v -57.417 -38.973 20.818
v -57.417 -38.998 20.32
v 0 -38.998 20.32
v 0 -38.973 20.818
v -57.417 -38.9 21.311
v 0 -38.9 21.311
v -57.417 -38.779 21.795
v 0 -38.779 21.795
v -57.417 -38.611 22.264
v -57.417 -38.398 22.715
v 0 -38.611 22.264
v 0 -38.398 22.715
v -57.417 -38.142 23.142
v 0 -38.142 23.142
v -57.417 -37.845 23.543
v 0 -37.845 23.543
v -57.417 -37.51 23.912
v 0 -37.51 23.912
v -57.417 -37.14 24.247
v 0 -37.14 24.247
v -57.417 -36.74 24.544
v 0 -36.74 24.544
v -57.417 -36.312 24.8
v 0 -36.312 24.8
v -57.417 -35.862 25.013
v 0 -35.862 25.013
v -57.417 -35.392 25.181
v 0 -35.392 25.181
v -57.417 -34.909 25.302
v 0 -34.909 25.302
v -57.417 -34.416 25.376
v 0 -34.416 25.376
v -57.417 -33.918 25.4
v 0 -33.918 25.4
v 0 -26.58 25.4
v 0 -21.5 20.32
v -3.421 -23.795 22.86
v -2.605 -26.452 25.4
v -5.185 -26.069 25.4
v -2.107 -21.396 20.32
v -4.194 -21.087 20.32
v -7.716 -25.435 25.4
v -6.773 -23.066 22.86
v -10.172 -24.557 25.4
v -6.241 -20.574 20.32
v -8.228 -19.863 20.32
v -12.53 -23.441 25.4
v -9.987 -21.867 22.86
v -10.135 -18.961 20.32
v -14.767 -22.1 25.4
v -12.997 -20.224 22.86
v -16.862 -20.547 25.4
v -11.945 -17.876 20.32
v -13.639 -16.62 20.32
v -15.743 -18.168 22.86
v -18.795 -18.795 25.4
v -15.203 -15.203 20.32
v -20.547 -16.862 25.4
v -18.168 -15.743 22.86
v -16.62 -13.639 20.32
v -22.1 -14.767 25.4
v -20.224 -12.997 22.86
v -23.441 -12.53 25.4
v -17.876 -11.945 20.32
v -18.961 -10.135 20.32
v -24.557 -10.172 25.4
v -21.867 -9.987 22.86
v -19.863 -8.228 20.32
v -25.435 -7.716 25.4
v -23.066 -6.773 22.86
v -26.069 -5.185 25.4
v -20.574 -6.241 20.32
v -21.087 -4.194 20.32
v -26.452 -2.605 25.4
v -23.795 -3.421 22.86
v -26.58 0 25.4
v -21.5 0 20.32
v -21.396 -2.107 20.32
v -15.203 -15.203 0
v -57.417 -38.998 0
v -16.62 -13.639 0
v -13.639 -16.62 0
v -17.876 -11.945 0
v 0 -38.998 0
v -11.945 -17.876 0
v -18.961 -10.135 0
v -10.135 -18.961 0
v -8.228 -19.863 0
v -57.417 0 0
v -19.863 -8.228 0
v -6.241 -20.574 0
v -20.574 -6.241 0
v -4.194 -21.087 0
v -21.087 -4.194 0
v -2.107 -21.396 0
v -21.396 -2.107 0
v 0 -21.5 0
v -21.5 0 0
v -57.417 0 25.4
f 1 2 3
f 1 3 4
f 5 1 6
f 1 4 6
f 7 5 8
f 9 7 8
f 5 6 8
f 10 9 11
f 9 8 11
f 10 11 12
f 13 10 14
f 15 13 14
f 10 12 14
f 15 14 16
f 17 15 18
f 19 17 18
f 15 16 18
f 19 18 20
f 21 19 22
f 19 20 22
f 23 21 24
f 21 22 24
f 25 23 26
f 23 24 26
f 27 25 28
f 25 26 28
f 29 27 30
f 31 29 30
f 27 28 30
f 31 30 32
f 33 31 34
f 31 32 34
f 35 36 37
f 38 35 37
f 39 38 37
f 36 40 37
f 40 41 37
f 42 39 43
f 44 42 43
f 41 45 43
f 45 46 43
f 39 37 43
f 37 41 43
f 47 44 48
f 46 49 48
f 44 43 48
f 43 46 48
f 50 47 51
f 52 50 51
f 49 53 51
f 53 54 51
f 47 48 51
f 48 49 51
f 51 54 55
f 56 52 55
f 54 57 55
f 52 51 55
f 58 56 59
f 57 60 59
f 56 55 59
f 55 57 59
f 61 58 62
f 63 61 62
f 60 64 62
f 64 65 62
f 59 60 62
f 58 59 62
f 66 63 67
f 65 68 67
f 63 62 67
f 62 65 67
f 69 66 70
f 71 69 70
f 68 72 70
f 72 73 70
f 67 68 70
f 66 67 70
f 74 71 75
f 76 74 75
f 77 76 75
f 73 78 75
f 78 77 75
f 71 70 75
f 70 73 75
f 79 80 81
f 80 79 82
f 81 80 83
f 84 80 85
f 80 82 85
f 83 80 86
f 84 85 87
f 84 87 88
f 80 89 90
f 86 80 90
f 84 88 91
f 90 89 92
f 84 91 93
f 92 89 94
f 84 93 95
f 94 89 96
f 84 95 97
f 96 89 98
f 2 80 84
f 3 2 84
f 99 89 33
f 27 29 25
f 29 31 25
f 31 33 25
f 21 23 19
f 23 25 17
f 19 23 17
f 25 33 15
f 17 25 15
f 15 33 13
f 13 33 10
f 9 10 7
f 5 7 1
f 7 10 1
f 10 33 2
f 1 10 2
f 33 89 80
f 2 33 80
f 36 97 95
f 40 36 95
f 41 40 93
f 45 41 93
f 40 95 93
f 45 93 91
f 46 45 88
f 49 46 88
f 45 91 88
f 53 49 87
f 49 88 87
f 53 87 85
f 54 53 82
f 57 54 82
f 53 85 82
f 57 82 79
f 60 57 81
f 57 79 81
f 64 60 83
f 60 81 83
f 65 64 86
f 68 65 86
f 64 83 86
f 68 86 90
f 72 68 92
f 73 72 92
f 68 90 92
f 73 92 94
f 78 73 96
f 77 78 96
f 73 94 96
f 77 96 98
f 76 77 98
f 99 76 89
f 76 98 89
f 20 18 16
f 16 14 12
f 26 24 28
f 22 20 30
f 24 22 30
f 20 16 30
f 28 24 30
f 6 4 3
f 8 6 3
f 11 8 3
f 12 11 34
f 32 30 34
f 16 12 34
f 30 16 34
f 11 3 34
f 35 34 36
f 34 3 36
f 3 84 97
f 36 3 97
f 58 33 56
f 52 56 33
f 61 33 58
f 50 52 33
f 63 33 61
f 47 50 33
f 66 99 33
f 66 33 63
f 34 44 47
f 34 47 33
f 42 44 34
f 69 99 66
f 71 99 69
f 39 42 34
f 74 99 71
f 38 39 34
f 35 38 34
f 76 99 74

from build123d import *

# Parameters (mm, degrees)
F1_DEPTH = 25.4
F2_R     = 5.08
F3_SIZE  = 5.08


with BuildPart() as f1:
    # F0 (on Top) → F1 (new body)
    with BuildSketch(Plane.XY):
        with BuildLine():
            ThreePointArc((0, -21.4998775326), (-15.202709198, -15.202709198), (-21.4998775326, 0))
            Line((-21.4998775326, 0), (-57.4172474444, 0))
            Line((-57.4172474444, 0), (-57.4172474444, -38.9976762235))
            Line((-57.4172474444, -38.9976762235), (0, -38.9976762235))
            Line((0, -38.9976762235), (0, -21.4998775326))
        make_face()
    extrude(amount=F1_DEPTH)

    # F2
    f2_edges = [f1.edges().sort_by_distance(p)[0] for p in [
        (-28.708624, -38.997676, 25.4),
    ]]
    fillet(f2_edges, radius=F2_R)

    # F3
    f3_edges = [f1.edges().sort_by_distance(p)[0] for p in [
        (-15.202709, -15.202709, 25.4),
    ]]
    chamfer(f3_edges, length=F3_SIZE)


solid = f1.part
